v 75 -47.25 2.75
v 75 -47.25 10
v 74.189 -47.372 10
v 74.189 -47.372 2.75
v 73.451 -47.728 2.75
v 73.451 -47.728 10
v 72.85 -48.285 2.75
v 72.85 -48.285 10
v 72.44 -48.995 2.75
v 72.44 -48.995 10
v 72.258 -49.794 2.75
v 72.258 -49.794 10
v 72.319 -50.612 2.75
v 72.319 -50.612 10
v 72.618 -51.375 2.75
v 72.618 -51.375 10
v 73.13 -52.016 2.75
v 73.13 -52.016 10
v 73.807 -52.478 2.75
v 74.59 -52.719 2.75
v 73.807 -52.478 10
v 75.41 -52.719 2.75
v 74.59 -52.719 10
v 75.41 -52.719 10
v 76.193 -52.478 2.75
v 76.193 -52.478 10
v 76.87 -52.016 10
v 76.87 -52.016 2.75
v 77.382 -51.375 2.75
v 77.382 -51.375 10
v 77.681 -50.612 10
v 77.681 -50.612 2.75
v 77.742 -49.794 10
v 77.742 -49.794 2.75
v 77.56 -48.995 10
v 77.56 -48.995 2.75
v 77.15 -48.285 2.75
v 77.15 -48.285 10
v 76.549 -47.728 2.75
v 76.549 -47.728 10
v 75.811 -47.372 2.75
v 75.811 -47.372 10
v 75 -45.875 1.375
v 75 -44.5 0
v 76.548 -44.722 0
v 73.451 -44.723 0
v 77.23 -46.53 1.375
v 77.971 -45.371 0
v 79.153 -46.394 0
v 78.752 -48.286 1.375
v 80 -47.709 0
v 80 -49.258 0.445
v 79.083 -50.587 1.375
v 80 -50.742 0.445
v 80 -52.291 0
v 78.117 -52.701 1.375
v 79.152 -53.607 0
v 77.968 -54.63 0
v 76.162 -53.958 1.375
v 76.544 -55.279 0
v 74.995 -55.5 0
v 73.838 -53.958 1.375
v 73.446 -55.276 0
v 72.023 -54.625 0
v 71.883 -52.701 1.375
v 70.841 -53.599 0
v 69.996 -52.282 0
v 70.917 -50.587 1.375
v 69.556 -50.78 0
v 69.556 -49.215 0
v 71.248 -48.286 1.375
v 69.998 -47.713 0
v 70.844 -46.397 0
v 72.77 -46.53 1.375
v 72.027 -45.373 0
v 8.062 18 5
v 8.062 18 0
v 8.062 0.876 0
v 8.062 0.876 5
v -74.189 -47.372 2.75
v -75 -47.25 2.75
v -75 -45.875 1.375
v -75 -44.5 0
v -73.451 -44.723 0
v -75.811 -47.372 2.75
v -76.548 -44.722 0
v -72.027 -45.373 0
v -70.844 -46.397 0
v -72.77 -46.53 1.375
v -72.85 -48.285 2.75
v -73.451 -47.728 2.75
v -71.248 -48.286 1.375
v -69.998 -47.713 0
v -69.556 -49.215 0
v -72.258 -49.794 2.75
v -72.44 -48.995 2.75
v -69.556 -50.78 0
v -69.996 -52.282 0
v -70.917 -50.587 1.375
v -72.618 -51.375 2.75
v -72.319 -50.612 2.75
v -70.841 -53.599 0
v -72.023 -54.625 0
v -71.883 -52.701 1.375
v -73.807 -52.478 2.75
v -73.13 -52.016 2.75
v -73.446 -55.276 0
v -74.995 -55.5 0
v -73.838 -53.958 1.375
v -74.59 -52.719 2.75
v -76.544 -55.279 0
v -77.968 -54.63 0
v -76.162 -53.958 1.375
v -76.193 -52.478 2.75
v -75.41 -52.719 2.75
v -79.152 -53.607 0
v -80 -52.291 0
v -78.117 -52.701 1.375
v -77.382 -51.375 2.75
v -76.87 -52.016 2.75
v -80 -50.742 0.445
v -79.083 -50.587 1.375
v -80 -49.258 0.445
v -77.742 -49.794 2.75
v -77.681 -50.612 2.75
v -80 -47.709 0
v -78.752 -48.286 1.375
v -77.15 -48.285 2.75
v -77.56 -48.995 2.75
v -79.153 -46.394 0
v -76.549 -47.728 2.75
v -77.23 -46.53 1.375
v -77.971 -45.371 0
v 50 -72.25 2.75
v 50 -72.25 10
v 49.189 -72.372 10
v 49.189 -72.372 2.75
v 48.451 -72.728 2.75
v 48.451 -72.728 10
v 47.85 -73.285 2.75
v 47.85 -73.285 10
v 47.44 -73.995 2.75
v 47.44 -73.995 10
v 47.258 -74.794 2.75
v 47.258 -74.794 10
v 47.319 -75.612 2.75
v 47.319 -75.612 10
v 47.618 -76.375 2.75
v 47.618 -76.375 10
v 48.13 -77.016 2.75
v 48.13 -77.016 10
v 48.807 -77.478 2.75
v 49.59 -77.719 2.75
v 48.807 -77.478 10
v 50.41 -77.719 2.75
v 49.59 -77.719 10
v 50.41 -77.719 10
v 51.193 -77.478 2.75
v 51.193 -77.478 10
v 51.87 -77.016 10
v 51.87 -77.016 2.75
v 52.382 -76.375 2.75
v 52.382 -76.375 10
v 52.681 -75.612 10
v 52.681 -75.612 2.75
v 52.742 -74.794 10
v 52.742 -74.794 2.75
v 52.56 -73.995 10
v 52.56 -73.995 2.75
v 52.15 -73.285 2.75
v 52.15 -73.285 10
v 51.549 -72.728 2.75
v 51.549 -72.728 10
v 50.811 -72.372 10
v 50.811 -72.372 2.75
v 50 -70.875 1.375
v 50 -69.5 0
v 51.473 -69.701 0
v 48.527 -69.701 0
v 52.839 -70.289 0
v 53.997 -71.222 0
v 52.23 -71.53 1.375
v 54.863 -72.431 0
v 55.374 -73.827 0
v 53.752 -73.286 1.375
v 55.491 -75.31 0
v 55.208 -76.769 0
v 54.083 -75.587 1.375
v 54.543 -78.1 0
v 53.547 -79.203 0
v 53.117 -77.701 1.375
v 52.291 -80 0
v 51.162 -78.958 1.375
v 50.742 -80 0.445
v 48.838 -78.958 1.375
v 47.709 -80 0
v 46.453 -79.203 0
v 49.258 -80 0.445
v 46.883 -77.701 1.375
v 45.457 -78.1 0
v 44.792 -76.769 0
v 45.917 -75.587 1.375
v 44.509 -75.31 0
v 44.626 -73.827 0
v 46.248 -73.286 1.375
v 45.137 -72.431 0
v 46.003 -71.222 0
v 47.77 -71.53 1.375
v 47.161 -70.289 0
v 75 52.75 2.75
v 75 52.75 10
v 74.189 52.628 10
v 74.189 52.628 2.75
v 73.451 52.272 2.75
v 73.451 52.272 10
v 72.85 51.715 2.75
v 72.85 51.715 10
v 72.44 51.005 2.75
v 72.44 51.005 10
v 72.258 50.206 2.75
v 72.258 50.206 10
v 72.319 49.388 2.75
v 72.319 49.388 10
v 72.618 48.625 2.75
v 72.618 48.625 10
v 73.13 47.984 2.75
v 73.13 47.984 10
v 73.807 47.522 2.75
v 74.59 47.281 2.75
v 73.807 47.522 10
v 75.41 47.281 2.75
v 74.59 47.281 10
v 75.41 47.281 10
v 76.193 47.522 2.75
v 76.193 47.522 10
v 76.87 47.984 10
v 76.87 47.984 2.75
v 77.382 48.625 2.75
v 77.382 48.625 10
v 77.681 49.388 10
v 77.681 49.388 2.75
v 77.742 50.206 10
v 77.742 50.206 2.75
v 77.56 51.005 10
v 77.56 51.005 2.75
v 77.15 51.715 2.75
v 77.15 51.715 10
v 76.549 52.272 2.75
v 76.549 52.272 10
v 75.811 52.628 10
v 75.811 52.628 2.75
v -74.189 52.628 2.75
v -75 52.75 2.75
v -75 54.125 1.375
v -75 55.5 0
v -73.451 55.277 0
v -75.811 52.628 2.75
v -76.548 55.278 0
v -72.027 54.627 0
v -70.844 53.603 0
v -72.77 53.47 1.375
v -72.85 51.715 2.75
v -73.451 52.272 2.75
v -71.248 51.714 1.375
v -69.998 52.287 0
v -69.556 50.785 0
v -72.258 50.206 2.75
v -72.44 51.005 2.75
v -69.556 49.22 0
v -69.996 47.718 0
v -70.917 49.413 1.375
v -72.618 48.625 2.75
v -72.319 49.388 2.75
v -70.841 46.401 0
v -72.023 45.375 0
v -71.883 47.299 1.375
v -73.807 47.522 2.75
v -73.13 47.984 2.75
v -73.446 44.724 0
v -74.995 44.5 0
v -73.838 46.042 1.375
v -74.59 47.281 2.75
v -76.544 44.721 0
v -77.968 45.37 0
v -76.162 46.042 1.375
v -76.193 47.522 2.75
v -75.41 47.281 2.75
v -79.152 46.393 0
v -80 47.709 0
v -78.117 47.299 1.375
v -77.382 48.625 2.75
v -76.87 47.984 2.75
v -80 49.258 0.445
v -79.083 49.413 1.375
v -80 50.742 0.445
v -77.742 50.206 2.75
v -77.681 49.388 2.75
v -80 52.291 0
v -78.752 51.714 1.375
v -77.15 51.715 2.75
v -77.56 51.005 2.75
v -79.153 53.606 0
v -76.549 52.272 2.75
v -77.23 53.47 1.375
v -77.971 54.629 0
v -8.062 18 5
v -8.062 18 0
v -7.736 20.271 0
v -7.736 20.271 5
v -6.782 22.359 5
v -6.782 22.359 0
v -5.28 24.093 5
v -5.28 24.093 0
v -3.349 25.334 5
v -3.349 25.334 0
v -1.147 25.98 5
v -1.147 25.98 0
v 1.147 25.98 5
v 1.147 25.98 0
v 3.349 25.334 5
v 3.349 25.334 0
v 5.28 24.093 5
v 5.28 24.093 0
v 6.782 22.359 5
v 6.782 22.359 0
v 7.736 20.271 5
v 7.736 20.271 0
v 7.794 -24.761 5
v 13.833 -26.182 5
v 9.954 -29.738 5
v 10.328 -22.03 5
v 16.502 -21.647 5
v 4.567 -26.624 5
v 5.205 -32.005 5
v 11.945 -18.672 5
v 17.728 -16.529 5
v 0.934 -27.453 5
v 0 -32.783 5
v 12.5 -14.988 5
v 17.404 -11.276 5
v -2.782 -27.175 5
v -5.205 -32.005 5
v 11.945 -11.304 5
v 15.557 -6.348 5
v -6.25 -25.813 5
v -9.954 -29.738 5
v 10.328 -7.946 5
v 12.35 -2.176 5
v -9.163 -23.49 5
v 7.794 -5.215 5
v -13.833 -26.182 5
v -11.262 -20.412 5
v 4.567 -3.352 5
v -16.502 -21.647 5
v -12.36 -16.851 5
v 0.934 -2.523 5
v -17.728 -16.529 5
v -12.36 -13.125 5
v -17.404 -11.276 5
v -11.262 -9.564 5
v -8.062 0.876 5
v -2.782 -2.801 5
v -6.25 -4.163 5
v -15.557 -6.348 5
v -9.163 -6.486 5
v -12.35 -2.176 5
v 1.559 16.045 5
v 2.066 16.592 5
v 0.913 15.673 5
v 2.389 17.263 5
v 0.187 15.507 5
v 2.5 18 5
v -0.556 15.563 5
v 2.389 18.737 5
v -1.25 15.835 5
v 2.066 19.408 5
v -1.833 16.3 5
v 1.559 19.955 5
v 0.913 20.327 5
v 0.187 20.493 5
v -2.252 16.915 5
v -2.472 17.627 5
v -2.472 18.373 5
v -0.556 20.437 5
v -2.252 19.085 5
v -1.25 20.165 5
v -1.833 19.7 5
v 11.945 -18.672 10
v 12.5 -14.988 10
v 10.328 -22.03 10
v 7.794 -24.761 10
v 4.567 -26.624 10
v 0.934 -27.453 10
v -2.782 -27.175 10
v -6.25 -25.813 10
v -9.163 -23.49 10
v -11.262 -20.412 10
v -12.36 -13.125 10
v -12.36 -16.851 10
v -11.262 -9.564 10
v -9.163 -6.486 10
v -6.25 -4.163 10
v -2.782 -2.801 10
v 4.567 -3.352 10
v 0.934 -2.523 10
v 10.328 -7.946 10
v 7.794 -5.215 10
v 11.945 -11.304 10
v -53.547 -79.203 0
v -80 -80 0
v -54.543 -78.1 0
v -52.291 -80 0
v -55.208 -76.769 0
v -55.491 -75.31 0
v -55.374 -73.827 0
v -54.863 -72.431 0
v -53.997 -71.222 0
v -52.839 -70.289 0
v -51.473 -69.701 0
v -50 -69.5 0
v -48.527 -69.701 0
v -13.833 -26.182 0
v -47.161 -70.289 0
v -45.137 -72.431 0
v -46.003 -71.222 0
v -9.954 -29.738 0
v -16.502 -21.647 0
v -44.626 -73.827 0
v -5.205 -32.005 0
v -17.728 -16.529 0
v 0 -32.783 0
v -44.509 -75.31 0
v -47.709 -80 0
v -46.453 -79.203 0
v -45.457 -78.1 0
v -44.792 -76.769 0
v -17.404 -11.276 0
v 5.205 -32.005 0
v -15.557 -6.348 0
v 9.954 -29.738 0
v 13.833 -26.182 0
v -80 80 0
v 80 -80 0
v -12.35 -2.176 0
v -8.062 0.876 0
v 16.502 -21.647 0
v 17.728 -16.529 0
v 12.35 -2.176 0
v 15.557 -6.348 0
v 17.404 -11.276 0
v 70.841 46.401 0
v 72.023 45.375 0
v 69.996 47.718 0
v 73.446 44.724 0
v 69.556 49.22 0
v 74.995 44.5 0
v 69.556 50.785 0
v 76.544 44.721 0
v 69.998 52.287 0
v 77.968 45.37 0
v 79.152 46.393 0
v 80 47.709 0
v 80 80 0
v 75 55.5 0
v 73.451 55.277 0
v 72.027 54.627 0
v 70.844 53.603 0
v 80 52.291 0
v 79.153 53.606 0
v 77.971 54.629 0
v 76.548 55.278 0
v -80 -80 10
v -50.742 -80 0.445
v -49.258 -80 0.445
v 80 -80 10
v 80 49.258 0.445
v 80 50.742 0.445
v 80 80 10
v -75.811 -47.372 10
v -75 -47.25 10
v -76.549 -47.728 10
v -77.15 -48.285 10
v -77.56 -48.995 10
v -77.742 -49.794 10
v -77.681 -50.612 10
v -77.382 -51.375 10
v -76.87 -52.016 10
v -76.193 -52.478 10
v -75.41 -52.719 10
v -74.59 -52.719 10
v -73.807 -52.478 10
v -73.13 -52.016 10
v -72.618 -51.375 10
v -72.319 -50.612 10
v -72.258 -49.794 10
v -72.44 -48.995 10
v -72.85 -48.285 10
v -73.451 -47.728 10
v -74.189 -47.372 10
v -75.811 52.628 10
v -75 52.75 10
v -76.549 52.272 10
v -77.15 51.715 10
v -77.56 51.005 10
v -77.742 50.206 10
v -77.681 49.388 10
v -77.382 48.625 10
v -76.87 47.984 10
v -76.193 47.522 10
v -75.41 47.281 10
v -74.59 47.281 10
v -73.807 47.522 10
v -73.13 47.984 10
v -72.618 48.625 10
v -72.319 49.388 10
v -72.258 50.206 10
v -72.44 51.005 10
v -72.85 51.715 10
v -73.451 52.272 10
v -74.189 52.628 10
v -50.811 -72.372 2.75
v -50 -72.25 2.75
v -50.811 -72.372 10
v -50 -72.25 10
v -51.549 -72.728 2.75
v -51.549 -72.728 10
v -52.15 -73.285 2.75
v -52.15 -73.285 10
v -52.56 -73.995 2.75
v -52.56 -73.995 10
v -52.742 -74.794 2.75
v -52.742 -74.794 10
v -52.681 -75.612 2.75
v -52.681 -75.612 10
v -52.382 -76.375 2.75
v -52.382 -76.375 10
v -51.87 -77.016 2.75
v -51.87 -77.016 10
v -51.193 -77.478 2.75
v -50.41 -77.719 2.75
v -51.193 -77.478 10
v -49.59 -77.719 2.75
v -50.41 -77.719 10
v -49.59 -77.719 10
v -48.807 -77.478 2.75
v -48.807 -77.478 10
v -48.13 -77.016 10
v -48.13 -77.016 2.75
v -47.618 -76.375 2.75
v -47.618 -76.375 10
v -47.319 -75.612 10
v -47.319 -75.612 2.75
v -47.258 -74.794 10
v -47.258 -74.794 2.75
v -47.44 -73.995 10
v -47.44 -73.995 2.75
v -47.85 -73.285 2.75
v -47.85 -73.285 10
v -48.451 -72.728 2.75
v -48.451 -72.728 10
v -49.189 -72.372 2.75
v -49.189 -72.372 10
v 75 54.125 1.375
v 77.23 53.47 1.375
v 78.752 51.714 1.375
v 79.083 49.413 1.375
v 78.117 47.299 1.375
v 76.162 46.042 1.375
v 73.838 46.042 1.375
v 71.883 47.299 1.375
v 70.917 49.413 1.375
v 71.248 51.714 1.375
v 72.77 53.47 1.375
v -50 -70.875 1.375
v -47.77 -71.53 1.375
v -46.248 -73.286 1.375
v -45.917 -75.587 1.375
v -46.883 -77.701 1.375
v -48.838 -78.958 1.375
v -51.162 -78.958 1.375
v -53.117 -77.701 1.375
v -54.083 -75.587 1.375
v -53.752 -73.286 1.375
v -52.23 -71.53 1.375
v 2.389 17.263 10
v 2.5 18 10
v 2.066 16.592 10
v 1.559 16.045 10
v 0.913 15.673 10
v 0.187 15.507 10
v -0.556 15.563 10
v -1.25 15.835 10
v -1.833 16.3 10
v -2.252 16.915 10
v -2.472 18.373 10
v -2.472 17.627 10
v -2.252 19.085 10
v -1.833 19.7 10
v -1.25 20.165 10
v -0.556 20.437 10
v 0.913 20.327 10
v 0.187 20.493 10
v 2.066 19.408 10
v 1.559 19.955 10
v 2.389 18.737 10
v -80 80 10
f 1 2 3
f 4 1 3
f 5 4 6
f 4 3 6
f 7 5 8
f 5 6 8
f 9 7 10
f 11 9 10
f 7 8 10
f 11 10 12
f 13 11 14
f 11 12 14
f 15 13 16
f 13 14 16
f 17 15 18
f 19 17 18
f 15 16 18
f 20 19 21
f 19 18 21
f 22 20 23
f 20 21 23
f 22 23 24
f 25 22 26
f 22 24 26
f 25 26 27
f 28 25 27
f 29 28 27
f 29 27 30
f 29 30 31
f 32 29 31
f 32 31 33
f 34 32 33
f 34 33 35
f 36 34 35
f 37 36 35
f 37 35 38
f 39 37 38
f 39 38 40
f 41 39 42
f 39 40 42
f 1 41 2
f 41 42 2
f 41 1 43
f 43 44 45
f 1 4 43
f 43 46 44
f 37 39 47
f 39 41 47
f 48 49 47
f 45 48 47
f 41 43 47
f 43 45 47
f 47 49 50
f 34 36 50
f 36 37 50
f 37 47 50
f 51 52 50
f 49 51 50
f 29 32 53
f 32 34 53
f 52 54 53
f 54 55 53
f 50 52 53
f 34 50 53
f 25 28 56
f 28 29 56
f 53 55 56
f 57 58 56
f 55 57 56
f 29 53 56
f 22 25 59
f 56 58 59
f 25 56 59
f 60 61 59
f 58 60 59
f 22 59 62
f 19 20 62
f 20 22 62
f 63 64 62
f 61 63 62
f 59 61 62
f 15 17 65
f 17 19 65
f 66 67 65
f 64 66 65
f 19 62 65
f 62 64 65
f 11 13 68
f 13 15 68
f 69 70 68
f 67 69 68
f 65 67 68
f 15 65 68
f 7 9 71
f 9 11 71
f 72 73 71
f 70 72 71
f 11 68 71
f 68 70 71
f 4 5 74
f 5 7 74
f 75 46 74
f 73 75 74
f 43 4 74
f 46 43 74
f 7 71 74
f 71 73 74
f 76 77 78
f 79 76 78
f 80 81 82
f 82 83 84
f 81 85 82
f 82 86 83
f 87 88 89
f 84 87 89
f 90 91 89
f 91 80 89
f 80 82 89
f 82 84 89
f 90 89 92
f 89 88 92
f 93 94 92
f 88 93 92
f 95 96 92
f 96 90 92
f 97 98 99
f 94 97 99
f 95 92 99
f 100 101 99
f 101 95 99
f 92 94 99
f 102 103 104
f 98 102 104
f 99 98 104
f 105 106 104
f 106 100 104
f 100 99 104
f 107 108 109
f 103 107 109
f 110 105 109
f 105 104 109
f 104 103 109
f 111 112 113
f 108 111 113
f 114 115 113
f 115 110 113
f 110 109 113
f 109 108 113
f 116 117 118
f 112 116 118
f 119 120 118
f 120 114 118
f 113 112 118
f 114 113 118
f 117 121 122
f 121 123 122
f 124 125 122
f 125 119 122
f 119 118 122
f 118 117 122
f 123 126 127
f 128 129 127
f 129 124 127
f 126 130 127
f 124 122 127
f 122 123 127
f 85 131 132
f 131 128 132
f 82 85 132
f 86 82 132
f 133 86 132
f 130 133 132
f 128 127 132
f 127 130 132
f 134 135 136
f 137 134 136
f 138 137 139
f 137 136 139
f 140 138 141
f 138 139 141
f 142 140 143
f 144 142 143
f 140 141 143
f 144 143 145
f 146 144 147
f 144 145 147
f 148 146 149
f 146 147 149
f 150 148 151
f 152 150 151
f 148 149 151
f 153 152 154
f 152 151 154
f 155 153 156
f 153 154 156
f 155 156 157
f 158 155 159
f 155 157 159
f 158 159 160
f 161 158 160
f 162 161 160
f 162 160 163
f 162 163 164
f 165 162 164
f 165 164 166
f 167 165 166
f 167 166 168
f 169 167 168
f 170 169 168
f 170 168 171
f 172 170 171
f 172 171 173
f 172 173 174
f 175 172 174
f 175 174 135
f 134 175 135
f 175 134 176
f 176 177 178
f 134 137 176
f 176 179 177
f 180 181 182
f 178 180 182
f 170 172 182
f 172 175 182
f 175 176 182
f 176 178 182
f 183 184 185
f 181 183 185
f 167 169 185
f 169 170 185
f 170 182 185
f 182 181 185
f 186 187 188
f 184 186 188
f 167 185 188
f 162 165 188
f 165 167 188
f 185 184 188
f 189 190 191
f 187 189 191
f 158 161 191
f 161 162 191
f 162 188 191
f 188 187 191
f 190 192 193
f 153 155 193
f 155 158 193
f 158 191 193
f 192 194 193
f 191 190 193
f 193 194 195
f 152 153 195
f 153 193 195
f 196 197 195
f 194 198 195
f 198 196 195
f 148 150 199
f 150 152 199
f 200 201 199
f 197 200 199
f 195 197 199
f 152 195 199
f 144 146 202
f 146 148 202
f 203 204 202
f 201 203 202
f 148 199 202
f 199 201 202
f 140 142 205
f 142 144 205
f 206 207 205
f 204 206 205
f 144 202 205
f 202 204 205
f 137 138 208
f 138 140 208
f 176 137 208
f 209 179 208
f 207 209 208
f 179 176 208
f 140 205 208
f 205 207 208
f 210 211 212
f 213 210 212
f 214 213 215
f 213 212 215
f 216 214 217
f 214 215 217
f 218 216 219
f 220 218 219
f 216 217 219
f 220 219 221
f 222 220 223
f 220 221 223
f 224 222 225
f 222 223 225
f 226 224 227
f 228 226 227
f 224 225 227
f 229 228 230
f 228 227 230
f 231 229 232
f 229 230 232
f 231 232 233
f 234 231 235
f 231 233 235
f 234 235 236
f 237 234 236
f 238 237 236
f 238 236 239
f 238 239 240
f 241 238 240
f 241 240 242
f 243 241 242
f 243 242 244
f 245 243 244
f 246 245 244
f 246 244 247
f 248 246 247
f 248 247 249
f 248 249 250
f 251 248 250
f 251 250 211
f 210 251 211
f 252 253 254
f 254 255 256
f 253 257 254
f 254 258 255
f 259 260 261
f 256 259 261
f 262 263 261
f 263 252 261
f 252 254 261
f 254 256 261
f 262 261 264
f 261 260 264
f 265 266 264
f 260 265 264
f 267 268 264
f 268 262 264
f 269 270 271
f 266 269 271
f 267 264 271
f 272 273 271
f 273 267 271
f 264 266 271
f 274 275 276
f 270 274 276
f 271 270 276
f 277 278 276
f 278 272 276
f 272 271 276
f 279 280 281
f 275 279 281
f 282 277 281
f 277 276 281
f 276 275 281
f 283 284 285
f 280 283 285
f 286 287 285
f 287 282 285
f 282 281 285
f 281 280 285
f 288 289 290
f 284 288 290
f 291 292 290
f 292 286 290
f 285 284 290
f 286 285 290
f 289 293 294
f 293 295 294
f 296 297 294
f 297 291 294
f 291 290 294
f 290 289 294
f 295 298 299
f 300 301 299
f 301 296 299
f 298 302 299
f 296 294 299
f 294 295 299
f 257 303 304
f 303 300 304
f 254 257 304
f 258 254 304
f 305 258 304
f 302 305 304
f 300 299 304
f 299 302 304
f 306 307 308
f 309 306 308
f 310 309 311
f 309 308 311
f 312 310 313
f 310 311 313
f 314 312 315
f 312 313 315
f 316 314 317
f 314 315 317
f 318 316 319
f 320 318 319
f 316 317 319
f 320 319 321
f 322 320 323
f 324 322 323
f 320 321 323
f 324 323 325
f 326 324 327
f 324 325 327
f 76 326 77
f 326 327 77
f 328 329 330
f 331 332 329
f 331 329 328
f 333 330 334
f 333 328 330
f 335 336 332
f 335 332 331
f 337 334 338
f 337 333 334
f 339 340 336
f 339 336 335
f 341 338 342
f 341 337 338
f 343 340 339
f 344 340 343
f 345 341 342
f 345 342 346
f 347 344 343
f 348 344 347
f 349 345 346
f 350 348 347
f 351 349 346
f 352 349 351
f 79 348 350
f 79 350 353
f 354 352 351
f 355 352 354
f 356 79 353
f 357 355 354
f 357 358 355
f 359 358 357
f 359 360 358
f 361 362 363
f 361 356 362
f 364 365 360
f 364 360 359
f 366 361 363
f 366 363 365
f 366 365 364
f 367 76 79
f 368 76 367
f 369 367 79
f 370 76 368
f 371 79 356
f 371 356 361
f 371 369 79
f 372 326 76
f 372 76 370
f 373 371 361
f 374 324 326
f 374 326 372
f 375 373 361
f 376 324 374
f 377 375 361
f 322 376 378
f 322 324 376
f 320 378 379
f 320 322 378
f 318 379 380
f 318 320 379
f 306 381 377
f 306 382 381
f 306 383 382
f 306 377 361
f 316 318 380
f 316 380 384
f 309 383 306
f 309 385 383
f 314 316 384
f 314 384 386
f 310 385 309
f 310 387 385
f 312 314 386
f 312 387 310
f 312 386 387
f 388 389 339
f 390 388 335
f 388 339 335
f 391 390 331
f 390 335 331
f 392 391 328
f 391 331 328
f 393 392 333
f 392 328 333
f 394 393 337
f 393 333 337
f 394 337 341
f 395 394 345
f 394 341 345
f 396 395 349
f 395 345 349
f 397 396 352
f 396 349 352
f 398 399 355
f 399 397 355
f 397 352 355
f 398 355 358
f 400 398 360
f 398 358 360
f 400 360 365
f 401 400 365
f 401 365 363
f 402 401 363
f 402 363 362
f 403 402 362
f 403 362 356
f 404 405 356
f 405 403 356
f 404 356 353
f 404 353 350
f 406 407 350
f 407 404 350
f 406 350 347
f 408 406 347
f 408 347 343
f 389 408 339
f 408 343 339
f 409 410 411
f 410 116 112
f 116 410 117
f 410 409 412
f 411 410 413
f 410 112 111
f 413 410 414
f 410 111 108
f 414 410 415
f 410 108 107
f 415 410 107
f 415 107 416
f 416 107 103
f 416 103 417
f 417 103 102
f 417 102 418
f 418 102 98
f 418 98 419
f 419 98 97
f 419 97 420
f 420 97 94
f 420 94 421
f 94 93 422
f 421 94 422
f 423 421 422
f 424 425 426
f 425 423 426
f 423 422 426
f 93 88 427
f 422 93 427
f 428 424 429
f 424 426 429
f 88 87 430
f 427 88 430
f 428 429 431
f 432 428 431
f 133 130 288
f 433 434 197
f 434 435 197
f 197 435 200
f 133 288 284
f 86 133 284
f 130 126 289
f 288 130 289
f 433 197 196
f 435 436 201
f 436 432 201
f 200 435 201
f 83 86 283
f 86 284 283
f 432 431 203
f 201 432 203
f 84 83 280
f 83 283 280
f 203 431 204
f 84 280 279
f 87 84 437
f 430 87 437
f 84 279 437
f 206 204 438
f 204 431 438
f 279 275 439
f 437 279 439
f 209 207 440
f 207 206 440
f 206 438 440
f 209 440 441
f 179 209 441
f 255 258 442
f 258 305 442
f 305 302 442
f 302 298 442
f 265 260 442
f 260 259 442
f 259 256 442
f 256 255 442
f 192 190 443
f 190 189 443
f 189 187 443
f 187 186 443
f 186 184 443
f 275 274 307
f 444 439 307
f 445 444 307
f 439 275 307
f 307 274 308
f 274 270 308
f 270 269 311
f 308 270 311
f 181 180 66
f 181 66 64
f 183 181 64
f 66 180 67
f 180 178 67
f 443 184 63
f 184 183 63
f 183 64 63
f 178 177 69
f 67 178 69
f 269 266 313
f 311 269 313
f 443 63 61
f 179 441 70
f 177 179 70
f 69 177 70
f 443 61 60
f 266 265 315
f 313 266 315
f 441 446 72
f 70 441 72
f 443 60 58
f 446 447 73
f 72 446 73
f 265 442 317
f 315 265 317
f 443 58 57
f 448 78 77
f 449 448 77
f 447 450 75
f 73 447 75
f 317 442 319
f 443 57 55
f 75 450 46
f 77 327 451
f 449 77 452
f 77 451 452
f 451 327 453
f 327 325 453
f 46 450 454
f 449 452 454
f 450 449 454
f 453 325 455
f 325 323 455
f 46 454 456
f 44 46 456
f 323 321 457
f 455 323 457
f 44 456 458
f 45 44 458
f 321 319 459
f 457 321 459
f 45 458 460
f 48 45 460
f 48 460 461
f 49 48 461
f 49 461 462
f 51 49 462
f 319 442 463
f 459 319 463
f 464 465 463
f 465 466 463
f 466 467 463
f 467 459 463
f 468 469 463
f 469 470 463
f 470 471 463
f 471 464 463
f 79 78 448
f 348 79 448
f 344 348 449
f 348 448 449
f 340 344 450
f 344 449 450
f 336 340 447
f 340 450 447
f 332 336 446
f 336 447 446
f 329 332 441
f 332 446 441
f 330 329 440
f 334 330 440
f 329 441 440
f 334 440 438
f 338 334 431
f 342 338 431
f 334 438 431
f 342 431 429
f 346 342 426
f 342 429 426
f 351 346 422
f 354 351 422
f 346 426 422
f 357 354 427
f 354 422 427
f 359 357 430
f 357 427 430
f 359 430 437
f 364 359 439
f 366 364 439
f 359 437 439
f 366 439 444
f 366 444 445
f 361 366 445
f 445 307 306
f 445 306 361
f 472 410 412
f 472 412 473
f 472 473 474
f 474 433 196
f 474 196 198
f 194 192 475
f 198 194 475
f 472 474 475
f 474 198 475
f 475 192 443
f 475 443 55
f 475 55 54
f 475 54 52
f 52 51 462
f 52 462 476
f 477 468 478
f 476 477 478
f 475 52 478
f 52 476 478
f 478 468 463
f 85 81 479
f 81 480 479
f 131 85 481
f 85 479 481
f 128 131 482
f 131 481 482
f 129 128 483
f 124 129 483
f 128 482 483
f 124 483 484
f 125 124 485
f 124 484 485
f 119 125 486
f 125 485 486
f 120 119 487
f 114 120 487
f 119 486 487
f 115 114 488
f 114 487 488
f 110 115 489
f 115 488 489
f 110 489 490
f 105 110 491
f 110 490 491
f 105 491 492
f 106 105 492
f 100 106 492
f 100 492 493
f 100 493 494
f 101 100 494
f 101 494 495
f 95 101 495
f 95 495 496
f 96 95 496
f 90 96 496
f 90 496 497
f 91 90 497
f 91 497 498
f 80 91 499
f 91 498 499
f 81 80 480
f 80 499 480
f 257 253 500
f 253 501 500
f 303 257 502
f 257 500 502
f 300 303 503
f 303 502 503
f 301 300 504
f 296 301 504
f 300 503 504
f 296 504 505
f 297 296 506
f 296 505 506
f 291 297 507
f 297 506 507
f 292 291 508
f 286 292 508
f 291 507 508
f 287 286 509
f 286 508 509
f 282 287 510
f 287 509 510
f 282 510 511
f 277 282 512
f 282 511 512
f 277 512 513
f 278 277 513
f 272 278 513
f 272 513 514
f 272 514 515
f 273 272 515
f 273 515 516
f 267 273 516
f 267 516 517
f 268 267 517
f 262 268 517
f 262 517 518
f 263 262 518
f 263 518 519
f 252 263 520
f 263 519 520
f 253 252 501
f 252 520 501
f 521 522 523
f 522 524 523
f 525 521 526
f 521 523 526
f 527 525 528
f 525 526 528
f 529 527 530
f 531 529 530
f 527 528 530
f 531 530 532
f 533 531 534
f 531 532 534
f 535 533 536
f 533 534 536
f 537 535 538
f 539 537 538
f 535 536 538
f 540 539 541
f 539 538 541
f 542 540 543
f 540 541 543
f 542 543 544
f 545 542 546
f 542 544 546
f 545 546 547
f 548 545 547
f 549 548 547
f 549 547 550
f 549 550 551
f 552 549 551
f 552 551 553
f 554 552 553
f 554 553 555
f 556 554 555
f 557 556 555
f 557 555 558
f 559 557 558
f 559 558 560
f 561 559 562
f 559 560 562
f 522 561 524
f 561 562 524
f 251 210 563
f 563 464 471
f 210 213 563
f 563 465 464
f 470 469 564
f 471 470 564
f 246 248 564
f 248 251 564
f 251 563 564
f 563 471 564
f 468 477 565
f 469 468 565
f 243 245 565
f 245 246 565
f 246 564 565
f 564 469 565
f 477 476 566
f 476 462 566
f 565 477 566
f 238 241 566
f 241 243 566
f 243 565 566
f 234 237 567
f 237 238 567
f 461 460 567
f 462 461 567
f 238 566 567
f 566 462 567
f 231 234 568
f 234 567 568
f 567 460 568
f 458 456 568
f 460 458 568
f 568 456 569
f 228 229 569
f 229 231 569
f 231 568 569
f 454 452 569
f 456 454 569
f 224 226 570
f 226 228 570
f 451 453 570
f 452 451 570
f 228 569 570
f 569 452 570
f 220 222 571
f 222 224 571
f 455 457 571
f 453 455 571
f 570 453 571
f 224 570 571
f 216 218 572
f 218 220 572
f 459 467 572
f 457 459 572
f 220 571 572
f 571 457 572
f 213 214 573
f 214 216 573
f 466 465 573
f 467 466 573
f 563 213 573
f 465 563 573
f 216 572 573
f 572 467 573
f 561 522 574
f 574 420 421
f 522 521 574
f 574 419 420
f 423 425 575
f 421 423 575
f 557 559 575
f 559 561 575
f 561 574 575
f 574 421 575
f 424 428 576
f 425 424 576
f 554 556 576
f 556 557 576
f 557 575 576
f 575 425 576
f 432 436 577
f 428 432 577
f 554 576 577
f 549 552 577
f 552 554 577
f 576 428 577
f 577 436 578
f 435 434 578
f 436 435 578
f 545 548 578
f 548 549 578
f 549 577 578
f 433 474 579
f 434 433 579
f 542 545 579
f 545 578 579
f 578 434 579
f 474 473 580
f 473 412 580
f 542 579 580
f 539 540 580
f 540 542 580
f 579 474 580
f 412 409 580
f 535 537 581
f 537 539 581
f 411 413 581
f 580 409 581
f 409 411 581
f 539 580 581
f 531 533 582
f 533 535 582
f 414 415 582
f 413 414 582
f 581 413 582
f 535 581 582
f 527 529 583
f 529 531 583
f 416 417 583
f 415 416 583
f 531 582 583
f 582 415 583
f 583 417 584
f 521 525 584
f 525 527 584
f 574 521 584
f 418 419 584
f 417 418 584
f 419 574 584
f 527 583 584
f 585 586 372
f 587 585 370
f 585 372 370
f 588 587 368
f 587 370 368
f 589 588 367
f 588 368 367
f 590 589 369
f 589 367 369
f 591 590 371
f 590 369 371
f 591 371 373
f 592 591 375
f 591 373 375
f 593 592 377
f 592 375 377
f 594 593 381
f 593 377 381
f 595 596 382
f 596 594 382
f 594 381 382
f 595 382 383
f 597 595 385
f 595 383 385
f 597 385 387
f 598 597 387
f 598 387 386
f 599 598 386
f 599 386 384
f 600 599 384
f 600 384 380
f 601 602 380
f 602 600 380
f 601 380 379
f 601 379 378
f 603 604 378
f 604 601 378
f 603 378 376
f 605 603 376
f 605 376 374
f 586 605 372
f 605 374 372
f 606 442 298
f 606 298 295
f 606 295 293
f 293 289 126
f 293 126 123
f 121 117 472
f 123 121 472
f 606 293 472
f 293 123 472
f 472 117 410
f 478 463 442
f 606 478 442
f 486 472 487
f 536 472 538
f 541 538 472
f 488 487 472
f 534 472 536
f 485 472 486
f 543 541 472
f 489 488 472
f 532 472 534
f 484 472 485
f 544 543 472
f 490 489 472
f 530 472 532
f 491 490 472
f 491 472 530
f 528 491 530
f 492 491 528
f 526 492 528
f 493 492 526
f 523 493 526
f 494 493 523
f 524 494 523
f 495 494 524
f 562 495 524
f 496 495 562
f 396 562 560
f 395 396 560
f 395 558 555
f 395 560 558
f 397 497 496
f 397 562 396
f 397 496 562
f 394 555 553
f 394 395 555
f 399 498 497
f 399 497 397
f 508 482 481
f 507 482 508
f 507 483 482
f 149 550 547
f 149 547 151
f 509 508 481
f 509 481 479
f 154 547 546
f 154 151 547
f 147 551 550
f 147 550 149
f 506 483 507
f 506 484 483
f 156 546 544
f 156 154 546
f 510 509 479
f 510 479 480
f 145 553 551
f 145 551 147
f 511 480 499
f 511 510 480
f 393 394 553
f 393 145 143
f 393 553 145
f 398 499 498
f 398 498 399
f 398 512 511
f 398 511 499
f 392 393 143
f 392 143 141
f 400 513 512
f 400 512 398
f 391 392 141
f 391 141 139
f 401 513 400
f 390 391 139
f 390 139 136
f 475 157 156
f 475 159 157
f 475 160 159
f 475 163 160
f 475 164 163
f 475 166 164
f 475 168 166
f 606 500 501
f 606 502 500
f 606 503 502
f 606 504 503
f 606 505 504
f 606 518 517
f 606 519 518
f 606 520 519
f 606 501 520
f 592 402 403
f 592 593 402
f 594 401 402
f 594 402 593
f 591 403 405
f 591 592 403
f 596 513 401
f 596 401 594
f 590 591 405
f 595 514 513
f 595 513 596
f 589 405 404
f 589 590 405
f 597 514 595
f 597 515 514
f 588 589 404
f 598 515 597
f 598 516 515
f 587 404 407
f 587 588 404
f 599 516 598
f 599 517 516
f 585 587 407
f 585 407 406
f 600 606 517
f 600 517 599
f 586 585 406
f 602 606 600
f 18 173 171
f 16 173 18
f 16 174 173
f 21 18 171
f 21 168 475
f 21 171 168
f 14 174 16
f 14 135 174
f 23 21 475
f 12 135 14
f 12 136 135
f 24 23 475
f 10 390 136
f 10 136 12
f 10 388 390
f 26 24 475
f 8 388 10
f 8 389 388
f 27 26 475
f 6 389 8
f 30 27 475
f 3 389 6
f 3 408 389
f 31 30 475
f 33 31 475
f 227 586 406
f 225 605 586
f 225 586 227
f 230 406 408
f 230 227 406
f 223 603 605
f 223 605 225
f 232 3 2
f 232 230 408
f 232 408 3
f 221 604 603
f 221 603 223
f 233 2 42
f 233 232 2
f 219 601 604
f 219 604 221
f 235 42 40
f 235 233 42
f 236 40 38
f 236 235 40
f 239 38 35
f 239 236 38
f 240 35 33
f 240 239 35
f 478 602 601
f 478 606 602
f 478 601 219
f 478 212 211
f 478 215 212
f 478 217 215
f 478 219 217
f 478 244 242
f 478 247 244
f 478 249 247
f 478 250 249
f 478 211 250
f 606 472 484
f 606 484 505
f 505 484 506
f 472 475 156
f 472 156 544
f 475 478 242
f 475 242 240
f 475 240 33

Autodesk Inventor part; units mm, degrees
ref_plane "YZ Plane" through (0, 0, 0) normal (1, 0, 0) x (0, 1, 0)
ref_plane "XZ Plane" through (0, 0, 0) normal (0, 1, 0) x (-1, 0, 0)
ref_plane "XY Plane" through (0, 0, 0) normal (0, 0, 1) x (1, 0, 0)
sketch "Boceto1" plane through (0, 0, 0) normal (0, 0, 1) x (1, 0, 0)
  line L0 (-80, -80) -> (80, -80)
  line L1 (80, -80) -> (80, 80)
  line L2 (80, 80) -> (-80, 80)
  line L3 (-80, 80) -> (-80, -80)
  line L4 (-80, -80) -> (80, 80) construction
  line L5 (80, -80) -> (-80, 80) construction
  circle A0 centre (0, -14.988) radius 12.5
  circle A1 centre (0, 18) radius 2.5
  point P0 (0, 0)
  dimension "d0" = 160
  dimension "d1" = 160
  dimension "d2" = 25
  dimension "d3" = 14.988
  dimension "d4" = 5
  dimension "d5" = 18
extrude "Extrusión1" add sketch "Boceto1" along normal blind 10
sketch "Boceto2" plane through (0, 0, 0) normal (0, 0, -1) x (-1, 0, 0)
  line L0 (80, 80) -> (80, -80) projected
  line L1 (-80, 80) -> (80, 80) projected
  line L2 (-80, -80) -> (-80, 80) projected
  line L3 (80, -80) -> (-80, -80) projected
  line L4 (-80, -80) -> (-80, 80) construction
  line L5 (-80, 0) -> (80, 0) construction
  line L6 (0, -80) -> (0, 80) construction
  line L7 (-80, 80) -> (80, 80) construction
  point P0 (0, 0)
  point P1 (75, 50)
  point P2 (75, -50)
  point P3 (50, -75)
  point P4 (-50, -75)
  point P5 (-75, 50)
  point P6 (-75, -50)
  dimension "d20" = 30
  dimension "d21" = 30
hole "Agujero1" at (-75, 50, 0) at (-75, -50, 0) at (-50, -75, 0) at (50, -75, 0) at (75, -50, 0) at (75, 50, 0) direction (0, 0, 1) diameter 5.5 depth 20 tip angle 118 countersink diameter 11 countersink angle 90
sketch "Boceto3" plane through (0, 0, 0) normal (0, 0, -1) x (-1, 0, 0)
  circle A0 centre (0, -14.988) radius 12.5 projected
  circle A1 centre (0, 18) radius 2.5 projected
  arc A2 (8.0623, 18) -> (-8.0623, 18) centre (0, 18) ccw
  arc A3 (-8.0623, 0.8759) -> (8.0623, 0.8759) centre (0, -14.988) ccw
  line L0 (-8.0623, 18) -> (-8.0623, 0.8759)
  line L1 (8.0623, 18) -> (8.0623, 0.8759)
  point P0 (0, 0)
  dimension "d22" = 5.5623
  dimension "d23" = 5.2951
extrude "Extrusión2" cut sketch "Boceto3" against normal blind 5
properties part number "TAPA TRASERA" material "Plástico PMMA"
